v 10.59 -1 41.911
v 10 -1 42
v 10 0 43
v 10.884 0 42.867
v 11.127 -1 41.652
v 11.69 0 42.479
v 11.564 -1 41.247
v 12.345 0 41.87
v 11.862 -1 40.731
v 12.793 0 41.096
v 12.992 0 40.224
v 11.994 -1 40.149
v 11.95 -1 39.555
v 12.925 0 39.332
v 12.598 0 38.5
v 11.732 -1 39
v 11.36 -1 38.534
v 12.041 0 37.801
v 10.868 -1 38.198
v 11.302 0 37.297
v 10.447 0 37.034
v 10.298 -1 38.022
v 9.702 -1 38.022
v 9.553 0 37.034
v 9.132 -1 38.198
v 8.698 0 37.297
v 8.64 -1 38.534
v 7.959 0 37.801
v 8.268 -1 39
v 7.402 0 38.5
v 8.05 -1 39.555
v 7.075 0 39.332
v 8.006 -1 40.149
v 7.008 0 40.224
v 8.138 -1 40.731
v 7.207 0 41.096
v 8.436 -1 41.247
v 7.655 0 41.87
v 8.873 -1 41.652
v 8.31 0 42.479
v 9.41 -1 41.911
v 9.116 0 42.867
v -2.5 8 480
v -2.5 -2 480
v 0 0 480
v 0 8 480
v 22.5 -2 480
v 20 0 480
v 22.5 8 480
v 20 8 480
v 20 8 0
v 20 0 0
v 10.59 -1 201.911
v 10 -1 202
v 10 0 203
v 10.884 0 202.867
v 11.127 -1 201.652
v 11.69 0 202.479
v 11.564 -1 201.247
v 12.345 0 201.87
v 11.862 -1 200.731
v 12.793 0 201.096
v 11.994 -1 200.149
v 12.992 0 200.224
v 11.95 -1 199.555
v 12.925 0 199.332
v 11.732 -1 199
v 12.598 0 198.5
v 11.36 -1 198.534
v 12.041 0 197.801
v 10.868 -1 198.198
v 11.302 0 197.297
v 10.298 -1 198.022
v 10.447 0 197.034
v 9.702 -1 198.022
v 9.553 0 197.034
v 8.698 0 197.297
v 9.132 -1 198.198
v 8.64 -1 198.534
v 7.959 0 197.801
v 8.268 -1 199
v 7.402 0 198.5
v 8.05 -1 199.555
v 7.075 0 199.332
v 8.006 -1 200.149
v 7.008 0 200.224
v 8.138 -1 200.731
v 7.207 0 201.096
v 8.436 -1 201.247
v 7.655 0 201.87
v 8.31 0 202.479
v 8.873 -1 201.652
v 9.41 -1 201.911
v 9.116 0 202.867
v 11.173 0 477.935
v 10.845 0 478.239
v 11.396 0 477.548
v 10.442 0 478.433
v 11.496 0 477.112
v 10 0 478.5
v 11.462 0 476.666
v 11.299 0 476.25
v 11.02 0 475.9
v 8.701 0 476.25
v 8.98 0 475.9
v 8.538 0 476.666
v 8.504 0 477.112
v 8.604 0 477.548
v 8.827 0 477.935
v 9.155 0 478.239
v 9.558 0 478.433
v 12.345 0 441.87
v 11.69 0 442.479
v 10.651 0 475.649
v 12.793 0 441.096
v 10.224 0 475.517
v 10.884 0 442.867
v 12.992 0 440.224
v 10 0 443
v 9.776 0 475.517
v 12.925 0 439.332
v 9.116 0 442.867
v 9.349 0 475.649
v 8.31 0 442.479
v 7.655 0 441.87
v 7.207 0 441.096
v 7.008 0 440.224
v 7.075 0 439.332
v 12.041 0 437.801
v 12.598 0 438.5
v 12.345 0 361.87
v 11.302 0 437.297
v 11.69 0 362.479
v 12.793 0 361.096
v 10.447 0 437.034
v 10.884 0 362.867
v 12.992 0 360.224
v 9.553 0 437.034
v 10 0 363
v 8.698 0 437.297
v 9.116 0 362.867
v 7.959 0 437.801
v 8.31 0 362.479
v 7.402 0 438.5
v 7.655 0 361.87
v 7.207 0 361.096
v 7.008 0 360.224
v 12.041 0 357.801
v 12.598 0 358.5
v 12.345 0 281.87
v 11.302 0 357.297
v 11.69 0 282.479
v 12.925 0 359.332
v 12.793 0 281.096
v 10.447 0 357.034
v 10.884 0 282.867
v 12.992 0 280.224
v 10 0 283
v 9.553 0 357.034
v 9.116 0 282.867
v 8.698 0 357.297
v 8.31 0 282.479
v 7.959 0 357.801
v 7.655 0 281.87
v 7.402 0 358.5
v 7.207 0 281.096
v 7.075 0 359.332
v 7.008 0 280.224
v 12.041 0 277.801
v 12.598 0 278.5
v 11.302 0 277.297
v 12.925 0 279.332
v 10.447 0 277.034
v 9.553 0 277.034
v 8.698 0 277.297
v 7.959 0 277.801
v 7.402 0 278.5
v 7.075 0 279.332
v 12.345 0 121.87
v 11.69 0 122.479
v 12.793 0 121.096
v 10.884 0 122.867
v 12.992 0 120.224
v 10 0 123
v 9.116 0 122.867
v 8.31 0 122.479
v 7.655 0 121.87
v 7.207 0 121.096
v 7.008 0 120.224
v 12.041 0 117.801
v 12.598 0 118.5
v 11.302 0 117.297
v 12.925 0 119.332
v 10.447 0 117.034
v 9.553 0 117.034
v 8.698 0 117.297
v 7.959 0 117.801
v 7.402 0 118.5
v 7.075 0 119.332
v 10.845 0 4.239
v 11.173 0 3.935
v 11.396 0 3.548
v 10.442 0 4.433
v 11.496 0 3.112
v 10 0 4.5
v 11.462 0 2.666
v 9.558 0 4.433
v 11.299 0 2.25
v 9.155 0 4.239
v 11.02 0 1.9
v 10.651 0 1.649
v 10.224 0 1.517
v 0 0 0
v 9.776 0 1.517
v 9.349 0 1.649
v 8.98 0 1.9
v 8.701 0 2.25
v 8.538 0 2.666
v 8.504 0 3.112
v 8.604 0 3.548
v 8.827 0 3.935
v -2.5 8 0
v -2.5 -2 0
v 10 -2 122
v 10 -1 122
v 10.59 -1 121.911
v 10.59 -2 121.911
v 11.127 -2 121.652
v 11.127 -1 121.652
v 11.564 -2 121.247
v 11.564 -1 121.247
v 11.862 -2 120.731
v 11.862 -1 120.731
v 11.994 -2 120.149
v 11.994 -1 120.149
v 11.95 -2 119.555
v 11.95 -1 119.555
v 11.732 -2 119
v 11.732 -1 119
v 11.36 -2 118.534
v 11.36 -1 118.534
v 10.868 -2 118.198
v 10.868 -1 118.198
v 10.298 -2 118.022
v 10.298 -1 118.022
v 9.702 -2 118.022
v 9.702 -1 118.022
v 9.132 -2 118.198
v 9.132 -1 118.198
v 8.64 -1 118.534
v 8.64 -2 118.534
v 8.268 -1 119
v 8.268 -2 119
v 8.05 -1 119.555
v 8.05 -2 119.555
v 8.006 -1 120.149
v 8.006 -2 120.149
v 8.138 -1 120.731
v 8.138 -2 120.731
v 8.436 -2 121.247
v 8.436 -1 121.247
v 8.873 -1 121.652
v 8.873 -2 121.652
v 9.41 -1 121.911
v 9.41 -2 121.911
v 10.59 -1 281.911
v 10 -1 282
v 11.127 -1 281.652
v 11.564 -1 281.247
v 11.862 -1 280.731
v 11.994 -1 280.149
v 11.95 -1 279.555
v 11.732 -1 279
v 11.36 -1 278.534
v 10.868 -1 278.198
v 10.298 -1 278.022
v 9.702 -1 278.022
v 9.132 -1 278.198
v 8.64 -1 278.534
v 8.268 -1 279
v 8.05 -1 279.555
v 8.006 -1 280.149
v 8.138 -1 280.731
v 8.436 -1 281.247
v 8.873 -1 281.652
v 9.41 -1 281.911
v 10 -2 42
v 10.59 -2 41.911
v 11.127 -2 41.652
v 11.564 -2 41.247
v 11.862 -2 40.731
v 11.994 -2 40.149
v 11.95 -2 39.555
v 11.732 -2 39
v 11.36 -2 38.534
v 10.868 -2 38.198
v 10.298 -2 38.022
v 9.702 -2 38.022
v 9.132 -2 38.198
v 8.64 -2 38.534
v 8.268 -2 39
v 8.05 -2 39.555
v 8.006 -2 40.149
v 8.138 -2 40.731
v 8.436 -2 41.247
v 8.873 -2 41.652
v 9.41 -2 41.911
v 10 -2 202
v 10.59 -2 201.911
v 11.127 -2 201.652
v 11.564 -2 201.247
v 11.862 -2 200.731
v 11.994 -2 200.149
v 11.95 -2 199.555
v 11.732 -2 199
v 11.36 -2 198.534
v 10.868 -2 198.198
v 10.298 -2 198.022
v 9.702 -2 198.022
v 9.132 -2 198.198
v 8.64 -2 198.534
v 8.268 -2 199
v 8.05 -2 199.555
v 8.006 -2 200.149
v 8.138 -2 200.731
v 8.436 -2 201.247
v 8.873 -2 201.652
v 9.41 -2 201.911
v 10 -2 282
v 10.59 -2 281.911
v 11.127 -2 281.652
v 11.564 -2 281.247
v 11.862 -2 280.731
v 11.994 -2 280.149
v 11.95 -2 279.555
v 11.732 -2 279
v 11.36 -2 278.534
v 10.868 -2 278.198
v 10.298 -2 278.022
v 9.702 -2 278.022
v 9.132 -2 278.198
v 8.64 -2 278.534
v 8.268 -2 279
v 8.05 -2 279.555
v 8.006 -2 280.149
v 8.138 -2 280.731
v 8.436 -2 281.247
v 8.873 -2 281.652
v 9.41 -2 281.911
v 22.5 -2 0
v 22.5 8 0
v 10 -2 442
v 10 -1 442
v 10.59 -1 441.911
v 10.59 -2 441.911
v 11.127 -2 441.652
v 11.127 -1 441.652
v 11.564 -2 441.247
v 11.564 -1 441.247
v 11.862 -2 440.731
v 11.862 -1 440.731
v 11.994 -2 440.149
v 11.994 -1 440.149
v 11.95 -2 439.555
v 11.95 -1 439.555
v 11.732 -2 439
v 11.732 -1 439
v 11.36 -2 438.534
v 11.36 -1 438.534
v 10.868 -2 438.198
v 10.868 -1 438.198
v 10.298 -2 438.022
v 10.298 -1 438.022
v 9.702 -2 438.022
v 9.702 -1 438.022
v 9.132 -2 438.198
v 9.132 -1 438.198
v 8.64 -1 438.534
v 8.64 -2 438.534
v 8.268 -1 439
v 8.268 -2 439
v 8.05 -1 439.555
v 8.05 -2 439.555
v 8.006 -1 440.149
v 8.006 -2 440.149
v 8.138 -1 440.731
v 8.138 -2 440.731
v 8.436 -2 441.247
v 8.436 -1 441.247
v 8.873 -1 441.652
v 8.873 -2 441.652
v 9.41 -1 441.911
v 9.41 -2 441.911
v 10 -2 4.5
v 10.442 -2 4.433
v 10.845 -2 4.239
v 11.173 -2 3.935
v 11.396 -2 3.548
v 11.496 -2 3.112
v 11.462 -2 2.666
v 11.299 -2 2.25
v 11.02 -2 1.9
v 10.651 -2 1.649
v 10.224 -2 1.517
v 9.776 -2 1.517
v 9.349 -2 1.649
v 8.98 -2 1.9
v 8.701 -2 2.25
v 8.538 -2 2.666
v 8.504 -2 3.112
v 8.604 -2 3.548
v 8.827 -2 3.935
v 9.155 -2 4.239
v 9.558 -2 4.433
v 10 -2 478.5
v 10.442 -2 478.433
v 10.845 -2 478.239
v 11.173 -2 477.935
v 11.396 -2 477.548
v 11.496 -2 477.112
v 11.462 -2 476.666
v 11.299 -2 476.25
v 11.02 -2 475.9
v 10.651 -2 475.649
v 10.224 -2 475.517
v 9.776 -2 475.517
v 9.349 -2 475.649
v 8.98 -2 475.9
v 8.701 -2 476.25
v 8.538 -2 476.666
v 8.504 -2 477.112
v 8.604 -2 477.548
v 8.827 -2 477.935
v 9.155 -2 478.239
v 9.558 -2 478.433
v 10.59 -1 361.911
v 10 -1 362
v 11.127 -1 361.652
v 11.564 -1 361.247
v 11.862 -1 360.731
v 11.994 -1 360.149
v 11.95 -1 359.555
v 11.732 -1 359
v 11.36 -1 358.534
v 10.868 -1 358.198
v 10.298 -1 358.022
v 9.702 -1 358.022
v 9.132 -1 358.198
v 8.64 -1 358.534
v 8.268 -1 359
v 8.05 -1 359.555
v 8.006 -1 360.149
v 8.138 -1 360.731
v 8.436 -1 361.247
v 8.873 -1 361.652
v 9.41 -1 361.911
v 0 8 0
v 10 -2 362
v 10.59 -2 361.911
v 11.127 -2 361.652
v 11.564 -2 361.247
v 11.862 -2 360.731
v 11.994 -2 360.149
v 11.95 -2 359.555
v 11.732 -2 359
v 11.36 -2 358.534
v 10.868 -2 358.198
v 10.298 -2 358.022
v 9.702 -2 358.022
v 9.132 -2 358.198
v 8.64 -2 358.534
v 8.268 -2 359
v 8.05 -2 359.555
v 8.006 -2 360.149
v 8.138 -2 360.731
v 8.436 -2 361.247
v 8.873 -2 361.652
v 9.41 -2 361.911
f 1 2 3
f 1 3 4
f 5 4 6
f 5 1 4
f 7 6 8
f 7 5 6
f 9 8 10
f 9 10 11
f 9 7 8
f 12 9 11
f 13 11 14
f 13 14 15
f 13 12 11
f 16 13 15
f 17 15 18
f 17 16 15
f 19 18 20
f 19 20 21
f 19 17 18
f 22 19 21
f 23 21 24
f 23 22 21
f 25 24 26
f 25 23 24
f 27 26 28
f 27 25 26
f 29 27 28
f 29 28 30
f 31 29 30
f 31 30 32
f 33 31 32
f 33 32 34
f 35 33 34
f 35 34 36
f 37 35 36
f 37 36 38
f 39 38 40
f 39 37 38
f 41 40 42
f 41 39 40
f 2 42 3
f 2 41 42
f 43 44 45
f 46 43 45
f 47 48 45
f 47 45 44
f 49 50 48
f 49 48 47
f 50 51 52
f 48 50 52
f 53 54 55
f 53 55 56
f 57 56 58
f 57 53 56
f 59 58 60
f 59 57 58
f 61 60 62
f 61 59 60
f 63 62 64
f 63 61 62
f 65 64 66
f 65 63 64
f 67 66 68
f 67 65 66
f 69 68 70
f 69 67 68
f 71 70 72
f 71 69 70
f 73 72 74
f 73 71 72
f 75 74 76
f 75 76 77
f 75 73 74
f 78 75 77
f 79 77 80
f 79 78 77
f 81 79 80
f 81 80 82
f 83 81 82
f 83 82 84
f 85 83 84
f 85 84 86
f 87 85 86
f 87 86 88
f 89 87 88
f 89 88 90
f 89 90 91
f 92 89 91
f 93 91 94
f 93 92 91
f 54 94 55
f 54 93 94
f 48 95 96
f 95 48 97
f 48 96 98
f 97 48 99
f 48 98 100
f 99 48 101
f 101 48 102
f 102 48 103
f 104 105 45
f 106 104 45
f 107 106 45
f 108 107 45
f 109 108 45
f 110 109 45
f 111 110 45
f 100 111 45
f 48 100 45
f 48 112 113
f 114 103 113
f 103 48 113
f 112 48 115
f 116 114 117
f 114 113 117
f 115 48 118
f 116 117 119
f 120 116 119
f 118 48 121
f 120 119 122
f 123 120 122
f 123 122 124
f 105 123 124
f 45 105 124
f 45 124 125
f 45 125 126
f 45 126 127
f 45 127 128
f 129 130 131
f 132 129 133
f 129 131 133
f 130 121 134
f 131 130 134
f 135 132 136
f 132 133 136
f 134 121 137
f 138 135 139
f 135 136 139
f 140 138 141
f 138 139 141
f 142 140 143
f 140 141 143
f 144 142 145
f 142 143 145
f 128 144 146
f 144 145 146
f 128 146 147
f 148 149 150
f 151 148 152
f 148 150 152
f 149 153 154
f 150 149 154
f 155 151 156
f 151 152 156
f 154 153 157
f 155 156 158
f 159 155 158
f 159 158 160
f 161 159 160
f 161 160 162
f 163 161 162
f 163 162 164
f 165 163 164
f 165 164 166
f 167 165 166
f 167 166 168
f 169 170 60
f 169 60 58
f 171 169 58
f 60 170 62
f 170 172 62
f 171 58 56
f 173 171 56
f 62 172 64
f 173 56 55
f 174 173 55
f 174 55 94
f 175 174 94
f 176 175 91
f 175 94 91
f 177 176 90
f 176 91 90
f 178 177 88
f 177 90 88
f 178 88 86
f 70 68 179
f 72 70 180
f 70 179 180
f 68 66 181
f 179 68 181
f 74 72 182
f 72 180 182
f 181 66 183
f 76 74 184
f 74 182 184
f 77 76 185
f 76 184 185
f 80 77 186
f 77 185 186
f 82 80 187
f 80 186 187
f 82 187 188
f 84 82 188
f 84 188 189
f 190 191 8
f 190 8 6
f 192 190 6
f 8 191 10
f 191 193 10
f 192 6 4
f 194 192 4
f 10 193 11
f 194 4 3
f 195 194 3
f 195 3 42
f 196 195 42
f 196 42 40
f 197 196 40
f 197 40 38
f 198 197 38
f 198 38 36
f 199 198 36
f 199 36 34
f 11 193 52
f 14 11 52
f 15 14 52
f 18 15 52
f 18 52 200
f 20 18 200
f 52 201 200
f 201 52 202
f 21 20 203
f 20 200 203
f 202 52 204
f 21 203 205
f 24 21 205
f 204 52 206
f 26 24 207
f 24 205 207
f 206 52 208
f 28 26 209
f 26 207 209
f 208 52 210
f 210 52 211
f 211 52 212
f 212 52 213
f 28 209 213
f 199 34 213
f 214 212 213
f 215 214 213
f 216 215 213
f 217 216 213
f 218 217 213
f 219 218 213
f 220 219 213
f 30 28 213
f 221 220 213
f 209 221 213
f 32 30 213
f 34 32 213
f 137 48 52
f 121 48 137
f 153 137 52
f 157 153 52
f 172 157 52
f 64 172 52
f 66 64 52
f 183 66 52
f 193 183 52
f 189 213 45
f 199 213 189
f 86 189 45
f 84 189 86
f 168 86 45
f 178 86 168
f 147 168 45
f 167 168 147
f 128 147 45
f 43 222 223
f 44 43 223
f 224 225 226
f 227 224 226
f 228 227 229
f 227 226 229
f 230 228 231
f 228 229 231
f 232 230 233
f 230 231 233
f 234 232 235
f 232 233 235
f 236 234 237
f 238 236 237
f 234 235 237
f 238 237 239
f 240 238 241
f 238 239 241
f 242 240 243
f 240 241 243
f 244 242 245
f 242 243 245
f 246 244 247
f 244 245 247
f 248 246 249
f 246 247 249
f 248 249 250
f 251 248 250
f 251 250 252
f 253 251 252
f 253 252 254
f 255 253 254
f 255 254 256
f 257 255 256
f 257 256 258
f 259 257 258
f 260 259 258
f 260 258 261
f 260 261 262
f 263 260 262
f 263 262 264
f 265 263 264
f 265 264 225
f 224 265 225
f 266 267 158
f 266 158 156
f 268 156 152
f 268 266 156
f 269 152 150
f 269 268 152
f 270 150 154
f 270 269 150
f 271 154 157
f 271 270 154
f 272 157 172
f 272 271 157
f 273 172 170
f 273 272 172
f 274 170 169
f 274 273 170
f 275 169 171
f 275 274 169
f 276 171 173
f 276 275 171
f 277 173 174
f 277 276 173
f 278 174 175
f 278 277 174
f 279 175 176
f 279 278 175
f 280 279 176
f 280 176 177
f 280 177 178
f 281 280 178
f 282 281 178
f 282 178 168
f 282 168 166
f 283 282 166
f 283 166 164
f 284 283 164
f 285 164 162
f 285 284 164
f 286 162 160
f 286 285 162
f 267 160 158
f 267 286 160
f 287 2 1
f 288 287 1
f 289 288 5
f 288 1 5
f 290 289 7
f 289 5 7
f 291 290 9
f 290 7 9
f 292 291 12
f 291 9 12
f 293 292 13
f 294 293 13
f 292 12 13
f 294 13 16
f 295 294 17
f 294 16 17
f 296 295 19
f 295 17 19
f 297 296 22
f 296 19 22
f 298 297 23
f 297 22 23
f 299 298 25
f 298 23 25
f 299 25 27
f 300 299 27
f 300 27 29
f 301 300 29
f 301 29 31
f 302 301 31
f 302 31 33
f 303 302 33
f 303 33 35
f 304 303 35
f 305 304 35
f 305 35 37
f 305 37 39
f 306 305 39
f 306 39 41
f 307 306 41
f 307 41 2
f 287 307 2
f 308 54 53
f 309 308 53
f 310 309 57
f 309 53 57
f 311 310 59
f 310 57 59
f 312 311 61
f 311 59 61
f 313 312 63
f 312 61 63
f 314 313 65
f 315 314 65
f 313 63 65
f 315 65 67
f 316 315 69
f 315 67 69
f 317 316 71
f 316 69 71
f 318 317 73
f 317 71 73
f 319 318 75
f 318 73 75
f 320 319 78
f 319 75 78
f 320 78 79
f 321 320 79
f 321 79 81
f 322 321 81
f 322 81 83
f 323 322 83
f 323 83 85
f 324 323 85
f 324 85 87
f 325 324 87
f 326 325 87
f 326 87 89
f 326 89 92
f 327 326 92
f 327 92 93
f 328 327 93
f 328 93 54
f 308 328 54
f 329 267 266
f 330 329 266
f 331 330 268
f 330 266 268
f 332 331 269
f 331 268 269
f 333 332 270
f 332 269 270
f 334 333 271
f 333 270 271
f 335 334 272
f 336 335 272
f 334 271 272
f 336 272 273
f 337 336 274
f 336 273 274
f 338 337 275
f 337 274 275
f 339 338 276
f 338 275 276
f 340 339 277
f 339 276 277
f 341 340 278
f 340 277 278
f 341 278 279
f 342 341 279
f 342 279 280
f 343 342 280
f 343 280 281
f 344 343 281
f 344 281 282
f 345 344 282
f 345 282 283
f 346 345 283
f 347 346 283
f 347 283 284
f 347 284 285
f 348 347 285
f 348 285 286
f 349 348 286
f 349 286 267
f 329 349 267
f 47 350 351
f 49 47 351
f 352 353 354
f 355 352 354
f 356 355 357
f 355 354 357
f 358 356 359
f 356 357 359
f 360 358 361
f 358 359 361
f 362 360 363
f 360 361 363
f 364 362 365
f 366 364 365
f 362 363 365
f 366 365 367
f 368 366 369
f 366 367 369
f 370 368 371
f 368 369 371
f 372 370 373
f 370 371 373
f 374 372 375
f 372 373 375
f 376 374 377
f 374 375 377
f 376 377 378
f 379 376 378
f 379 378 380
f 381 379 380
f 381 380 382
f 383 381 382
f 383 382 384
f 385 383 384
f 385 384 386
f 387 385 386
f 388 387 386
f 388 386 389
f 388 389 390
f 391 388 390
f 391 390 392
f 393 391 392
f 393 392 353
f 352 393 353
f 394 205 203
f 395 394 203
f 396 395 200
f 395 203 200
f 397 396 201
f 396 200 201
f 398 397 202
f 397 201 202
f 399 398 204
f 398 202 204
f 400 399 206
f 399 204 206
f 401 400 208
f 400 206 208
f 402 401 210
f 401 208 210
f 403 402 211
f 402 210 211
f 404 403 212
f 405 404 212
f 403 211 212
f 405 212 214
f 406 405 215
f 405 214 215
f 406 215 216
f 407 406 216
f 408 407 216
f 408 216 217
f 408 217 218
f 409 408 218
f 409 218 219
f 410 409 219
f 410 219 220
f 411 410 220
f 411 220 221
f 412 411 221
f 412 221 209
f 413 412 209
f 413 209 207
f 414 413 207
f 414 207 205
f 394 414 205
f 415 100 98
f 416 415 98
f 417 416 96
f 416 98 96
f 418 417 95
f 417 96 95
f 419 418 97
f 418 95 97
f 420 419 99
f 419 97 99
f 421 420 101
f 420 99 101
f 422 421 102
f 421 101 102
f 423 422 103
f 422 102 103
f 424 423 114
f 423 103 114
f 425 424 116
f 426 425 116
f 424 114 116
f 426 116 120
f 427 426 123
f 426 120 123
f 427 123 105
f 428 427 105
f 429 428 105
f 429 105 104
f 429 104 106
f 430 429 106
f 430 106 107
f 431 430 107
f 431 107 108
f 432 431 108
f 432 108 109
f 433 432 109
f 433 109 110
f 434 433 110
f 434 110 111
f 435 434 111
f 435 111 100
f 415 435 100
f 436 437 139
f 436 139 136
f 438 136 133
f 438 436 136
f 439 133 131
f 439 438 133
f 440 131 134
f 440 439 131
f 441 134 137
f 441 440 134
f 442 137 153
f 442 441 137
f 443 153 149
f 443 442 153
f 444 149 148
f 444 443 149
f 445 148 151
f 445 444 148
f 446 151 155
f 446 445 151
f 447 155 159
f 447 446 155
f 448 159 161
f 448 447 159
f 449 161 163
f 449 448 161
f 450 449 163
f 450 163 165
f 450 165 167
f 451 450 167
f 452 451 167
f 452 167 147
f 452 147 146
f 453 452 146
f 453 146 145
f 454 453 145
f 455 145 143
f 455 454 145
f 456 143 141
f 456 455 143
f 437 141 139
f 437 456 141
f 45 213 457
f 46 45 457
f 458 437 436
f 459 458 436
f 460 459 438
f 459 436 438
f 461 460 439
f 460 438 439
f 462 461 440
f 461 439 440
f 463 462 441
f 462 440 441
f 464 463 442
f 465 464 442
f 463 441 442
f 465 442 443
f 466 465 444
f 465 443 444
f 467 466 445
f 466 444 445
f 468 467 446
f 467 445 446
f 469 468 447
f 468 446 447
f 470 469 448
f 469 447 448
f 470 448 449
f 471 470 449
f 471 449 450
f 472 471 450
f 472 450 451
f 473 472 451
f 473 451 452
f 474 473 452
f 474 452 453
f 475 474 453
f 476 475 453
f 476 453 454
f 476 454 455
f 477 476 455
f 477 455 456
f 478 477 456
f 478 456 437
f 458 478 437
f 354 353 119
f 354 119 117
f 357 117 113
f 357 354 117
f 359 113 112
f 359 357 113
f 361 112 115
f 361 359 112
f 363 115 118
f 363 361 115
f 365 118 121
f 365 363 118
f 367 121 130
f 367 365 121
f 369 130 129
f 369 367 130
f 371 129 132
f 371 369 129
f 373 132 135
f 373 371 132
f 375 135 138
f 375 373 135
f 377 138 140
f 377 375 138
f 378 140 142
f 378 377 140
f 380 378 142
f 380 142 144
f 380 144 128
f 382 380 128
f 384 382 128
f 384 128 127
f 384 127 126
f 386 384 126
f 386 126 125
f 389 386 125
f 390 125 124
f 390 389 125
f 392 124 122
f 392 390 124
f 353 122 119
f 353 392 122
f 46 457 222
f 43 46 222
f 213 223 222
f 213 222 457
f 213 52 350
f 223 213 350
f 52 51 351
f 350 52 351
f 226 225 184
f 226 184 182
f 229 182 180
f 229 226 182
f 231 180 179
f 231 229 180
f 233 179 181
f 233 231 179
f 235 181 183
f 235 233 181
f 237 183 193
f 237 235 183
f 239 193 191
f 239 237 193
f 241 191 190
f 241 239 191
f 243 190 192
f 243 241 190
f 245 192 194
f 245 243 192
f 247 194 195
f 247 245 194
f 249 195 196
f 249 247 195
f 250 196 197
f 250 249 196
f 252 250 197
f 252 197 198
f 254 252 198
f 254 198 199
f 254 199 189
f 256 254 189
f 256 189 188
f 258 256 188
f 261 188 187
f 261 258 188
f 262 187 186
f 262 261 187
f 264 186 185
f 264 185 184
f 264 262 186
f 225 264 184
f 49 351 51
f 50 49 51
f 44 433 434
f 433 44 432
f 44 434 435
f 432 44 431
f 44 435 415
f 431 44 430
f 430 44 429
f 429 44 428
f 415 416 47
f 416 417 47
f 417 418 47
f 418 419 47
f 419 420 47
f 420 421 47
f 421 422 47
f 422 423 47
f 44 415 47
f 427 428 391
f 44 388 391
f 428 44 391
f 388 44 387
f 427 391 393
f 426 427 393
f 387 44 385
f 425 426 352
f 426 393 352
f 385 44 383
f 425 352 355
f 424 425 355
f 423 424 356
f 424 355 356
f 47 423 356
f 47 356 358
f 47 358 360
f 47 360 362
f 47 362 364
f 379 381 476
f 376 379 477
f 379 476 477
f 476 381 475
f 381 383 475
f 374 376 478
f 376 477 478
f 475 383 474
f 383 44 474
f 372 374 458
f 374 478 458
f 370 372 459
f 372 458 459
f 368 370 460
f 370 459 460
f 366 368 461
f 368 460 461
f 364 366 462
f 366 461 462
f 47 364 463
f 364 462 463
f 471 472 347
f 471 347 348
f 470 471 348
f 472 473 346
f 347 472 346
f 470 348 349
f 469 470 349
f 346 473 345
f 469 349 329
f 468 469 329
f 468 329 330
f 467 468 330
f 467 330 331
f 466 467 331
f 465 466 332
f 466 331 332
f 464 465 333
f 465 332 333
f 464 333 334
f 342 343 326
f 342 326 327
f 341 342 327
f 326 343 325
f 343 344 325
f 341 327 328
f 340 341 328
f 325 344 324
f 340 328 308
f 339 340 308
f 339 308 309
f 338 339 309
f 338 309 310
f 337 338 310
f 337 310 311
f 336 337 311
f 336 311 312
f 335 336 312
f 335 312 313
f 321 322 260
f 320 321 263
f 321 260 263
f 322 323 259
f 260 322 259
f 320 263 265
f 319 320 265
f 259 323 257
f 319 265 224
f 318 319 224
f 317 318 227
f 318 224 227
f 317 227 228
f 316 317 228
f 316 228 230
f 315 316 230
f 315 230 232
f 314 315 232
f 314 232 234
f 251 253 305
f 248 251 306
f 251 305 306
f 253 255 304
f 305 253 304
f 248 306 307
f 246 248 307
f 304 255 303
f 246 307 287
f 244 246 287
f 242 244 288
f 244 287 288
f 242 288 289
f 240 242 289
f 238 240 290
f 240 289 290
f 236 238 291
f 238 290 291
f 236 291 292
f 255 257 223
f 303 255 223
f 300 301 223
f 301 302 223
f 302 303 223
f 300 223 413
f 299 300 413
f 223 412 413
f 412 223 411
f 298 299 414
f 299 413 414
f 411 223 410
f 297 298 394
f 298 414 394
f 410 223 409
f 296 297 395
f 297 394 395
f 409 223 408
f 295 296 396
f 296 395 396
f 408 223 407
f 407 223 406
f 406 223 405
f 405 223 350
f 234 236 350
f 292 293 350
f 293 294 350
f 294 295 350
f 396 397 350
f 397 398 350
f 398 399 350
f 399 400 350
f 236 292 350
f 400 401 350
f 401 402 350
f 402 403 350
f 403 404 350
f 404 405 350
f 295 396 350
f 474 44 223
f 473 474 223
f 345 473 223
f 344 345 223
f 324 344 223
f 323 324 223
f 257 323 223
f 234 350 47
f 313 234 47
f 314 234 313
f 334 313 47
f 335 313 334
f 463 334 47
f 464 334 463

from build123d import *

# Parameters (mm, degrees)
EXTRUDE_1_DEPTH     = 480
SKETCH_2_R          = 1.5
SKETCH_2_R_2        = 2
CUT_EXTRUDE_1_DEPTH = 481.59364332
CHAMFER_1_SIZE      = 1


with BuildPart() as part:
    # ｽｹｯﾁ1 → ﾎﾞｽ - 押し出し1 (new body)
    with BuildSketch(Plane.XY):
        Polygon((0, 8), (-2.5, 8), (-2.5, -2), (22.5, -2), (22.5, 8), (20, 8), (20, 0), (0, 0), align=None)
    extrude(amount=EXTRUDE_1_DEPTH)

    # ｽｹｯﾁ2 → ｶｯﾄ - 押し出し1 (cut, through all)
    with BuildSketch(Plane(origin=(0, 0, 0), x_dir=(1, 0, 0), z_dir=(0, 1, 0))):
        with Locations(Location((10, -477, 0), (0, 0, 270))):
            Circle(SKETCH_2_R)
        with Locations(Location((10, -440, 0), (0, 0, 270))):
            Circle(SKETCH_2_R_2)
        with Locations(Location((10, -360, 0), (0, 0, 270))):
            Circle(SKETCH_2_R_2)
        with Locations(Location((10, -280, 0), (0, 0, 270))):
            Circle(SKETCH_2_R_2)
        with Locations(Location((10, -200, 0), (0, 0, 270))):
            Circle(SKETCH_2_R_2)
        with Locations(Location((10, -120, 0), (0, 0, 270))):
            Circle(SKETCH_2_R_2)
        with Locations(Location((10, -40, 0), (0, 0, 270))):
            Circle(SKETCH_2_R_2)
        with Locations(Location((10, -3, 0), (0, 0, 270))):
            Circle(SKETCH_2_R)
    extrude(amount=-CUT_EXTRUDE_1_DEPTH, mode=Mode.SUBTRACT)

    # 面取り1
    chamfer_1_edges = [part.edges().sort_by_distance(p)[0] for p in [
        (10, 0, 438),
        (10, 0, 358),
        (10, 0, 278),
        (10, 0, 198),
        (10, 0, 118),
        (10, 0, 38),
    ]]
    chamfer(chamfer_1_edges, length=CHAMFER_1_SIZE)


solid = part.part
